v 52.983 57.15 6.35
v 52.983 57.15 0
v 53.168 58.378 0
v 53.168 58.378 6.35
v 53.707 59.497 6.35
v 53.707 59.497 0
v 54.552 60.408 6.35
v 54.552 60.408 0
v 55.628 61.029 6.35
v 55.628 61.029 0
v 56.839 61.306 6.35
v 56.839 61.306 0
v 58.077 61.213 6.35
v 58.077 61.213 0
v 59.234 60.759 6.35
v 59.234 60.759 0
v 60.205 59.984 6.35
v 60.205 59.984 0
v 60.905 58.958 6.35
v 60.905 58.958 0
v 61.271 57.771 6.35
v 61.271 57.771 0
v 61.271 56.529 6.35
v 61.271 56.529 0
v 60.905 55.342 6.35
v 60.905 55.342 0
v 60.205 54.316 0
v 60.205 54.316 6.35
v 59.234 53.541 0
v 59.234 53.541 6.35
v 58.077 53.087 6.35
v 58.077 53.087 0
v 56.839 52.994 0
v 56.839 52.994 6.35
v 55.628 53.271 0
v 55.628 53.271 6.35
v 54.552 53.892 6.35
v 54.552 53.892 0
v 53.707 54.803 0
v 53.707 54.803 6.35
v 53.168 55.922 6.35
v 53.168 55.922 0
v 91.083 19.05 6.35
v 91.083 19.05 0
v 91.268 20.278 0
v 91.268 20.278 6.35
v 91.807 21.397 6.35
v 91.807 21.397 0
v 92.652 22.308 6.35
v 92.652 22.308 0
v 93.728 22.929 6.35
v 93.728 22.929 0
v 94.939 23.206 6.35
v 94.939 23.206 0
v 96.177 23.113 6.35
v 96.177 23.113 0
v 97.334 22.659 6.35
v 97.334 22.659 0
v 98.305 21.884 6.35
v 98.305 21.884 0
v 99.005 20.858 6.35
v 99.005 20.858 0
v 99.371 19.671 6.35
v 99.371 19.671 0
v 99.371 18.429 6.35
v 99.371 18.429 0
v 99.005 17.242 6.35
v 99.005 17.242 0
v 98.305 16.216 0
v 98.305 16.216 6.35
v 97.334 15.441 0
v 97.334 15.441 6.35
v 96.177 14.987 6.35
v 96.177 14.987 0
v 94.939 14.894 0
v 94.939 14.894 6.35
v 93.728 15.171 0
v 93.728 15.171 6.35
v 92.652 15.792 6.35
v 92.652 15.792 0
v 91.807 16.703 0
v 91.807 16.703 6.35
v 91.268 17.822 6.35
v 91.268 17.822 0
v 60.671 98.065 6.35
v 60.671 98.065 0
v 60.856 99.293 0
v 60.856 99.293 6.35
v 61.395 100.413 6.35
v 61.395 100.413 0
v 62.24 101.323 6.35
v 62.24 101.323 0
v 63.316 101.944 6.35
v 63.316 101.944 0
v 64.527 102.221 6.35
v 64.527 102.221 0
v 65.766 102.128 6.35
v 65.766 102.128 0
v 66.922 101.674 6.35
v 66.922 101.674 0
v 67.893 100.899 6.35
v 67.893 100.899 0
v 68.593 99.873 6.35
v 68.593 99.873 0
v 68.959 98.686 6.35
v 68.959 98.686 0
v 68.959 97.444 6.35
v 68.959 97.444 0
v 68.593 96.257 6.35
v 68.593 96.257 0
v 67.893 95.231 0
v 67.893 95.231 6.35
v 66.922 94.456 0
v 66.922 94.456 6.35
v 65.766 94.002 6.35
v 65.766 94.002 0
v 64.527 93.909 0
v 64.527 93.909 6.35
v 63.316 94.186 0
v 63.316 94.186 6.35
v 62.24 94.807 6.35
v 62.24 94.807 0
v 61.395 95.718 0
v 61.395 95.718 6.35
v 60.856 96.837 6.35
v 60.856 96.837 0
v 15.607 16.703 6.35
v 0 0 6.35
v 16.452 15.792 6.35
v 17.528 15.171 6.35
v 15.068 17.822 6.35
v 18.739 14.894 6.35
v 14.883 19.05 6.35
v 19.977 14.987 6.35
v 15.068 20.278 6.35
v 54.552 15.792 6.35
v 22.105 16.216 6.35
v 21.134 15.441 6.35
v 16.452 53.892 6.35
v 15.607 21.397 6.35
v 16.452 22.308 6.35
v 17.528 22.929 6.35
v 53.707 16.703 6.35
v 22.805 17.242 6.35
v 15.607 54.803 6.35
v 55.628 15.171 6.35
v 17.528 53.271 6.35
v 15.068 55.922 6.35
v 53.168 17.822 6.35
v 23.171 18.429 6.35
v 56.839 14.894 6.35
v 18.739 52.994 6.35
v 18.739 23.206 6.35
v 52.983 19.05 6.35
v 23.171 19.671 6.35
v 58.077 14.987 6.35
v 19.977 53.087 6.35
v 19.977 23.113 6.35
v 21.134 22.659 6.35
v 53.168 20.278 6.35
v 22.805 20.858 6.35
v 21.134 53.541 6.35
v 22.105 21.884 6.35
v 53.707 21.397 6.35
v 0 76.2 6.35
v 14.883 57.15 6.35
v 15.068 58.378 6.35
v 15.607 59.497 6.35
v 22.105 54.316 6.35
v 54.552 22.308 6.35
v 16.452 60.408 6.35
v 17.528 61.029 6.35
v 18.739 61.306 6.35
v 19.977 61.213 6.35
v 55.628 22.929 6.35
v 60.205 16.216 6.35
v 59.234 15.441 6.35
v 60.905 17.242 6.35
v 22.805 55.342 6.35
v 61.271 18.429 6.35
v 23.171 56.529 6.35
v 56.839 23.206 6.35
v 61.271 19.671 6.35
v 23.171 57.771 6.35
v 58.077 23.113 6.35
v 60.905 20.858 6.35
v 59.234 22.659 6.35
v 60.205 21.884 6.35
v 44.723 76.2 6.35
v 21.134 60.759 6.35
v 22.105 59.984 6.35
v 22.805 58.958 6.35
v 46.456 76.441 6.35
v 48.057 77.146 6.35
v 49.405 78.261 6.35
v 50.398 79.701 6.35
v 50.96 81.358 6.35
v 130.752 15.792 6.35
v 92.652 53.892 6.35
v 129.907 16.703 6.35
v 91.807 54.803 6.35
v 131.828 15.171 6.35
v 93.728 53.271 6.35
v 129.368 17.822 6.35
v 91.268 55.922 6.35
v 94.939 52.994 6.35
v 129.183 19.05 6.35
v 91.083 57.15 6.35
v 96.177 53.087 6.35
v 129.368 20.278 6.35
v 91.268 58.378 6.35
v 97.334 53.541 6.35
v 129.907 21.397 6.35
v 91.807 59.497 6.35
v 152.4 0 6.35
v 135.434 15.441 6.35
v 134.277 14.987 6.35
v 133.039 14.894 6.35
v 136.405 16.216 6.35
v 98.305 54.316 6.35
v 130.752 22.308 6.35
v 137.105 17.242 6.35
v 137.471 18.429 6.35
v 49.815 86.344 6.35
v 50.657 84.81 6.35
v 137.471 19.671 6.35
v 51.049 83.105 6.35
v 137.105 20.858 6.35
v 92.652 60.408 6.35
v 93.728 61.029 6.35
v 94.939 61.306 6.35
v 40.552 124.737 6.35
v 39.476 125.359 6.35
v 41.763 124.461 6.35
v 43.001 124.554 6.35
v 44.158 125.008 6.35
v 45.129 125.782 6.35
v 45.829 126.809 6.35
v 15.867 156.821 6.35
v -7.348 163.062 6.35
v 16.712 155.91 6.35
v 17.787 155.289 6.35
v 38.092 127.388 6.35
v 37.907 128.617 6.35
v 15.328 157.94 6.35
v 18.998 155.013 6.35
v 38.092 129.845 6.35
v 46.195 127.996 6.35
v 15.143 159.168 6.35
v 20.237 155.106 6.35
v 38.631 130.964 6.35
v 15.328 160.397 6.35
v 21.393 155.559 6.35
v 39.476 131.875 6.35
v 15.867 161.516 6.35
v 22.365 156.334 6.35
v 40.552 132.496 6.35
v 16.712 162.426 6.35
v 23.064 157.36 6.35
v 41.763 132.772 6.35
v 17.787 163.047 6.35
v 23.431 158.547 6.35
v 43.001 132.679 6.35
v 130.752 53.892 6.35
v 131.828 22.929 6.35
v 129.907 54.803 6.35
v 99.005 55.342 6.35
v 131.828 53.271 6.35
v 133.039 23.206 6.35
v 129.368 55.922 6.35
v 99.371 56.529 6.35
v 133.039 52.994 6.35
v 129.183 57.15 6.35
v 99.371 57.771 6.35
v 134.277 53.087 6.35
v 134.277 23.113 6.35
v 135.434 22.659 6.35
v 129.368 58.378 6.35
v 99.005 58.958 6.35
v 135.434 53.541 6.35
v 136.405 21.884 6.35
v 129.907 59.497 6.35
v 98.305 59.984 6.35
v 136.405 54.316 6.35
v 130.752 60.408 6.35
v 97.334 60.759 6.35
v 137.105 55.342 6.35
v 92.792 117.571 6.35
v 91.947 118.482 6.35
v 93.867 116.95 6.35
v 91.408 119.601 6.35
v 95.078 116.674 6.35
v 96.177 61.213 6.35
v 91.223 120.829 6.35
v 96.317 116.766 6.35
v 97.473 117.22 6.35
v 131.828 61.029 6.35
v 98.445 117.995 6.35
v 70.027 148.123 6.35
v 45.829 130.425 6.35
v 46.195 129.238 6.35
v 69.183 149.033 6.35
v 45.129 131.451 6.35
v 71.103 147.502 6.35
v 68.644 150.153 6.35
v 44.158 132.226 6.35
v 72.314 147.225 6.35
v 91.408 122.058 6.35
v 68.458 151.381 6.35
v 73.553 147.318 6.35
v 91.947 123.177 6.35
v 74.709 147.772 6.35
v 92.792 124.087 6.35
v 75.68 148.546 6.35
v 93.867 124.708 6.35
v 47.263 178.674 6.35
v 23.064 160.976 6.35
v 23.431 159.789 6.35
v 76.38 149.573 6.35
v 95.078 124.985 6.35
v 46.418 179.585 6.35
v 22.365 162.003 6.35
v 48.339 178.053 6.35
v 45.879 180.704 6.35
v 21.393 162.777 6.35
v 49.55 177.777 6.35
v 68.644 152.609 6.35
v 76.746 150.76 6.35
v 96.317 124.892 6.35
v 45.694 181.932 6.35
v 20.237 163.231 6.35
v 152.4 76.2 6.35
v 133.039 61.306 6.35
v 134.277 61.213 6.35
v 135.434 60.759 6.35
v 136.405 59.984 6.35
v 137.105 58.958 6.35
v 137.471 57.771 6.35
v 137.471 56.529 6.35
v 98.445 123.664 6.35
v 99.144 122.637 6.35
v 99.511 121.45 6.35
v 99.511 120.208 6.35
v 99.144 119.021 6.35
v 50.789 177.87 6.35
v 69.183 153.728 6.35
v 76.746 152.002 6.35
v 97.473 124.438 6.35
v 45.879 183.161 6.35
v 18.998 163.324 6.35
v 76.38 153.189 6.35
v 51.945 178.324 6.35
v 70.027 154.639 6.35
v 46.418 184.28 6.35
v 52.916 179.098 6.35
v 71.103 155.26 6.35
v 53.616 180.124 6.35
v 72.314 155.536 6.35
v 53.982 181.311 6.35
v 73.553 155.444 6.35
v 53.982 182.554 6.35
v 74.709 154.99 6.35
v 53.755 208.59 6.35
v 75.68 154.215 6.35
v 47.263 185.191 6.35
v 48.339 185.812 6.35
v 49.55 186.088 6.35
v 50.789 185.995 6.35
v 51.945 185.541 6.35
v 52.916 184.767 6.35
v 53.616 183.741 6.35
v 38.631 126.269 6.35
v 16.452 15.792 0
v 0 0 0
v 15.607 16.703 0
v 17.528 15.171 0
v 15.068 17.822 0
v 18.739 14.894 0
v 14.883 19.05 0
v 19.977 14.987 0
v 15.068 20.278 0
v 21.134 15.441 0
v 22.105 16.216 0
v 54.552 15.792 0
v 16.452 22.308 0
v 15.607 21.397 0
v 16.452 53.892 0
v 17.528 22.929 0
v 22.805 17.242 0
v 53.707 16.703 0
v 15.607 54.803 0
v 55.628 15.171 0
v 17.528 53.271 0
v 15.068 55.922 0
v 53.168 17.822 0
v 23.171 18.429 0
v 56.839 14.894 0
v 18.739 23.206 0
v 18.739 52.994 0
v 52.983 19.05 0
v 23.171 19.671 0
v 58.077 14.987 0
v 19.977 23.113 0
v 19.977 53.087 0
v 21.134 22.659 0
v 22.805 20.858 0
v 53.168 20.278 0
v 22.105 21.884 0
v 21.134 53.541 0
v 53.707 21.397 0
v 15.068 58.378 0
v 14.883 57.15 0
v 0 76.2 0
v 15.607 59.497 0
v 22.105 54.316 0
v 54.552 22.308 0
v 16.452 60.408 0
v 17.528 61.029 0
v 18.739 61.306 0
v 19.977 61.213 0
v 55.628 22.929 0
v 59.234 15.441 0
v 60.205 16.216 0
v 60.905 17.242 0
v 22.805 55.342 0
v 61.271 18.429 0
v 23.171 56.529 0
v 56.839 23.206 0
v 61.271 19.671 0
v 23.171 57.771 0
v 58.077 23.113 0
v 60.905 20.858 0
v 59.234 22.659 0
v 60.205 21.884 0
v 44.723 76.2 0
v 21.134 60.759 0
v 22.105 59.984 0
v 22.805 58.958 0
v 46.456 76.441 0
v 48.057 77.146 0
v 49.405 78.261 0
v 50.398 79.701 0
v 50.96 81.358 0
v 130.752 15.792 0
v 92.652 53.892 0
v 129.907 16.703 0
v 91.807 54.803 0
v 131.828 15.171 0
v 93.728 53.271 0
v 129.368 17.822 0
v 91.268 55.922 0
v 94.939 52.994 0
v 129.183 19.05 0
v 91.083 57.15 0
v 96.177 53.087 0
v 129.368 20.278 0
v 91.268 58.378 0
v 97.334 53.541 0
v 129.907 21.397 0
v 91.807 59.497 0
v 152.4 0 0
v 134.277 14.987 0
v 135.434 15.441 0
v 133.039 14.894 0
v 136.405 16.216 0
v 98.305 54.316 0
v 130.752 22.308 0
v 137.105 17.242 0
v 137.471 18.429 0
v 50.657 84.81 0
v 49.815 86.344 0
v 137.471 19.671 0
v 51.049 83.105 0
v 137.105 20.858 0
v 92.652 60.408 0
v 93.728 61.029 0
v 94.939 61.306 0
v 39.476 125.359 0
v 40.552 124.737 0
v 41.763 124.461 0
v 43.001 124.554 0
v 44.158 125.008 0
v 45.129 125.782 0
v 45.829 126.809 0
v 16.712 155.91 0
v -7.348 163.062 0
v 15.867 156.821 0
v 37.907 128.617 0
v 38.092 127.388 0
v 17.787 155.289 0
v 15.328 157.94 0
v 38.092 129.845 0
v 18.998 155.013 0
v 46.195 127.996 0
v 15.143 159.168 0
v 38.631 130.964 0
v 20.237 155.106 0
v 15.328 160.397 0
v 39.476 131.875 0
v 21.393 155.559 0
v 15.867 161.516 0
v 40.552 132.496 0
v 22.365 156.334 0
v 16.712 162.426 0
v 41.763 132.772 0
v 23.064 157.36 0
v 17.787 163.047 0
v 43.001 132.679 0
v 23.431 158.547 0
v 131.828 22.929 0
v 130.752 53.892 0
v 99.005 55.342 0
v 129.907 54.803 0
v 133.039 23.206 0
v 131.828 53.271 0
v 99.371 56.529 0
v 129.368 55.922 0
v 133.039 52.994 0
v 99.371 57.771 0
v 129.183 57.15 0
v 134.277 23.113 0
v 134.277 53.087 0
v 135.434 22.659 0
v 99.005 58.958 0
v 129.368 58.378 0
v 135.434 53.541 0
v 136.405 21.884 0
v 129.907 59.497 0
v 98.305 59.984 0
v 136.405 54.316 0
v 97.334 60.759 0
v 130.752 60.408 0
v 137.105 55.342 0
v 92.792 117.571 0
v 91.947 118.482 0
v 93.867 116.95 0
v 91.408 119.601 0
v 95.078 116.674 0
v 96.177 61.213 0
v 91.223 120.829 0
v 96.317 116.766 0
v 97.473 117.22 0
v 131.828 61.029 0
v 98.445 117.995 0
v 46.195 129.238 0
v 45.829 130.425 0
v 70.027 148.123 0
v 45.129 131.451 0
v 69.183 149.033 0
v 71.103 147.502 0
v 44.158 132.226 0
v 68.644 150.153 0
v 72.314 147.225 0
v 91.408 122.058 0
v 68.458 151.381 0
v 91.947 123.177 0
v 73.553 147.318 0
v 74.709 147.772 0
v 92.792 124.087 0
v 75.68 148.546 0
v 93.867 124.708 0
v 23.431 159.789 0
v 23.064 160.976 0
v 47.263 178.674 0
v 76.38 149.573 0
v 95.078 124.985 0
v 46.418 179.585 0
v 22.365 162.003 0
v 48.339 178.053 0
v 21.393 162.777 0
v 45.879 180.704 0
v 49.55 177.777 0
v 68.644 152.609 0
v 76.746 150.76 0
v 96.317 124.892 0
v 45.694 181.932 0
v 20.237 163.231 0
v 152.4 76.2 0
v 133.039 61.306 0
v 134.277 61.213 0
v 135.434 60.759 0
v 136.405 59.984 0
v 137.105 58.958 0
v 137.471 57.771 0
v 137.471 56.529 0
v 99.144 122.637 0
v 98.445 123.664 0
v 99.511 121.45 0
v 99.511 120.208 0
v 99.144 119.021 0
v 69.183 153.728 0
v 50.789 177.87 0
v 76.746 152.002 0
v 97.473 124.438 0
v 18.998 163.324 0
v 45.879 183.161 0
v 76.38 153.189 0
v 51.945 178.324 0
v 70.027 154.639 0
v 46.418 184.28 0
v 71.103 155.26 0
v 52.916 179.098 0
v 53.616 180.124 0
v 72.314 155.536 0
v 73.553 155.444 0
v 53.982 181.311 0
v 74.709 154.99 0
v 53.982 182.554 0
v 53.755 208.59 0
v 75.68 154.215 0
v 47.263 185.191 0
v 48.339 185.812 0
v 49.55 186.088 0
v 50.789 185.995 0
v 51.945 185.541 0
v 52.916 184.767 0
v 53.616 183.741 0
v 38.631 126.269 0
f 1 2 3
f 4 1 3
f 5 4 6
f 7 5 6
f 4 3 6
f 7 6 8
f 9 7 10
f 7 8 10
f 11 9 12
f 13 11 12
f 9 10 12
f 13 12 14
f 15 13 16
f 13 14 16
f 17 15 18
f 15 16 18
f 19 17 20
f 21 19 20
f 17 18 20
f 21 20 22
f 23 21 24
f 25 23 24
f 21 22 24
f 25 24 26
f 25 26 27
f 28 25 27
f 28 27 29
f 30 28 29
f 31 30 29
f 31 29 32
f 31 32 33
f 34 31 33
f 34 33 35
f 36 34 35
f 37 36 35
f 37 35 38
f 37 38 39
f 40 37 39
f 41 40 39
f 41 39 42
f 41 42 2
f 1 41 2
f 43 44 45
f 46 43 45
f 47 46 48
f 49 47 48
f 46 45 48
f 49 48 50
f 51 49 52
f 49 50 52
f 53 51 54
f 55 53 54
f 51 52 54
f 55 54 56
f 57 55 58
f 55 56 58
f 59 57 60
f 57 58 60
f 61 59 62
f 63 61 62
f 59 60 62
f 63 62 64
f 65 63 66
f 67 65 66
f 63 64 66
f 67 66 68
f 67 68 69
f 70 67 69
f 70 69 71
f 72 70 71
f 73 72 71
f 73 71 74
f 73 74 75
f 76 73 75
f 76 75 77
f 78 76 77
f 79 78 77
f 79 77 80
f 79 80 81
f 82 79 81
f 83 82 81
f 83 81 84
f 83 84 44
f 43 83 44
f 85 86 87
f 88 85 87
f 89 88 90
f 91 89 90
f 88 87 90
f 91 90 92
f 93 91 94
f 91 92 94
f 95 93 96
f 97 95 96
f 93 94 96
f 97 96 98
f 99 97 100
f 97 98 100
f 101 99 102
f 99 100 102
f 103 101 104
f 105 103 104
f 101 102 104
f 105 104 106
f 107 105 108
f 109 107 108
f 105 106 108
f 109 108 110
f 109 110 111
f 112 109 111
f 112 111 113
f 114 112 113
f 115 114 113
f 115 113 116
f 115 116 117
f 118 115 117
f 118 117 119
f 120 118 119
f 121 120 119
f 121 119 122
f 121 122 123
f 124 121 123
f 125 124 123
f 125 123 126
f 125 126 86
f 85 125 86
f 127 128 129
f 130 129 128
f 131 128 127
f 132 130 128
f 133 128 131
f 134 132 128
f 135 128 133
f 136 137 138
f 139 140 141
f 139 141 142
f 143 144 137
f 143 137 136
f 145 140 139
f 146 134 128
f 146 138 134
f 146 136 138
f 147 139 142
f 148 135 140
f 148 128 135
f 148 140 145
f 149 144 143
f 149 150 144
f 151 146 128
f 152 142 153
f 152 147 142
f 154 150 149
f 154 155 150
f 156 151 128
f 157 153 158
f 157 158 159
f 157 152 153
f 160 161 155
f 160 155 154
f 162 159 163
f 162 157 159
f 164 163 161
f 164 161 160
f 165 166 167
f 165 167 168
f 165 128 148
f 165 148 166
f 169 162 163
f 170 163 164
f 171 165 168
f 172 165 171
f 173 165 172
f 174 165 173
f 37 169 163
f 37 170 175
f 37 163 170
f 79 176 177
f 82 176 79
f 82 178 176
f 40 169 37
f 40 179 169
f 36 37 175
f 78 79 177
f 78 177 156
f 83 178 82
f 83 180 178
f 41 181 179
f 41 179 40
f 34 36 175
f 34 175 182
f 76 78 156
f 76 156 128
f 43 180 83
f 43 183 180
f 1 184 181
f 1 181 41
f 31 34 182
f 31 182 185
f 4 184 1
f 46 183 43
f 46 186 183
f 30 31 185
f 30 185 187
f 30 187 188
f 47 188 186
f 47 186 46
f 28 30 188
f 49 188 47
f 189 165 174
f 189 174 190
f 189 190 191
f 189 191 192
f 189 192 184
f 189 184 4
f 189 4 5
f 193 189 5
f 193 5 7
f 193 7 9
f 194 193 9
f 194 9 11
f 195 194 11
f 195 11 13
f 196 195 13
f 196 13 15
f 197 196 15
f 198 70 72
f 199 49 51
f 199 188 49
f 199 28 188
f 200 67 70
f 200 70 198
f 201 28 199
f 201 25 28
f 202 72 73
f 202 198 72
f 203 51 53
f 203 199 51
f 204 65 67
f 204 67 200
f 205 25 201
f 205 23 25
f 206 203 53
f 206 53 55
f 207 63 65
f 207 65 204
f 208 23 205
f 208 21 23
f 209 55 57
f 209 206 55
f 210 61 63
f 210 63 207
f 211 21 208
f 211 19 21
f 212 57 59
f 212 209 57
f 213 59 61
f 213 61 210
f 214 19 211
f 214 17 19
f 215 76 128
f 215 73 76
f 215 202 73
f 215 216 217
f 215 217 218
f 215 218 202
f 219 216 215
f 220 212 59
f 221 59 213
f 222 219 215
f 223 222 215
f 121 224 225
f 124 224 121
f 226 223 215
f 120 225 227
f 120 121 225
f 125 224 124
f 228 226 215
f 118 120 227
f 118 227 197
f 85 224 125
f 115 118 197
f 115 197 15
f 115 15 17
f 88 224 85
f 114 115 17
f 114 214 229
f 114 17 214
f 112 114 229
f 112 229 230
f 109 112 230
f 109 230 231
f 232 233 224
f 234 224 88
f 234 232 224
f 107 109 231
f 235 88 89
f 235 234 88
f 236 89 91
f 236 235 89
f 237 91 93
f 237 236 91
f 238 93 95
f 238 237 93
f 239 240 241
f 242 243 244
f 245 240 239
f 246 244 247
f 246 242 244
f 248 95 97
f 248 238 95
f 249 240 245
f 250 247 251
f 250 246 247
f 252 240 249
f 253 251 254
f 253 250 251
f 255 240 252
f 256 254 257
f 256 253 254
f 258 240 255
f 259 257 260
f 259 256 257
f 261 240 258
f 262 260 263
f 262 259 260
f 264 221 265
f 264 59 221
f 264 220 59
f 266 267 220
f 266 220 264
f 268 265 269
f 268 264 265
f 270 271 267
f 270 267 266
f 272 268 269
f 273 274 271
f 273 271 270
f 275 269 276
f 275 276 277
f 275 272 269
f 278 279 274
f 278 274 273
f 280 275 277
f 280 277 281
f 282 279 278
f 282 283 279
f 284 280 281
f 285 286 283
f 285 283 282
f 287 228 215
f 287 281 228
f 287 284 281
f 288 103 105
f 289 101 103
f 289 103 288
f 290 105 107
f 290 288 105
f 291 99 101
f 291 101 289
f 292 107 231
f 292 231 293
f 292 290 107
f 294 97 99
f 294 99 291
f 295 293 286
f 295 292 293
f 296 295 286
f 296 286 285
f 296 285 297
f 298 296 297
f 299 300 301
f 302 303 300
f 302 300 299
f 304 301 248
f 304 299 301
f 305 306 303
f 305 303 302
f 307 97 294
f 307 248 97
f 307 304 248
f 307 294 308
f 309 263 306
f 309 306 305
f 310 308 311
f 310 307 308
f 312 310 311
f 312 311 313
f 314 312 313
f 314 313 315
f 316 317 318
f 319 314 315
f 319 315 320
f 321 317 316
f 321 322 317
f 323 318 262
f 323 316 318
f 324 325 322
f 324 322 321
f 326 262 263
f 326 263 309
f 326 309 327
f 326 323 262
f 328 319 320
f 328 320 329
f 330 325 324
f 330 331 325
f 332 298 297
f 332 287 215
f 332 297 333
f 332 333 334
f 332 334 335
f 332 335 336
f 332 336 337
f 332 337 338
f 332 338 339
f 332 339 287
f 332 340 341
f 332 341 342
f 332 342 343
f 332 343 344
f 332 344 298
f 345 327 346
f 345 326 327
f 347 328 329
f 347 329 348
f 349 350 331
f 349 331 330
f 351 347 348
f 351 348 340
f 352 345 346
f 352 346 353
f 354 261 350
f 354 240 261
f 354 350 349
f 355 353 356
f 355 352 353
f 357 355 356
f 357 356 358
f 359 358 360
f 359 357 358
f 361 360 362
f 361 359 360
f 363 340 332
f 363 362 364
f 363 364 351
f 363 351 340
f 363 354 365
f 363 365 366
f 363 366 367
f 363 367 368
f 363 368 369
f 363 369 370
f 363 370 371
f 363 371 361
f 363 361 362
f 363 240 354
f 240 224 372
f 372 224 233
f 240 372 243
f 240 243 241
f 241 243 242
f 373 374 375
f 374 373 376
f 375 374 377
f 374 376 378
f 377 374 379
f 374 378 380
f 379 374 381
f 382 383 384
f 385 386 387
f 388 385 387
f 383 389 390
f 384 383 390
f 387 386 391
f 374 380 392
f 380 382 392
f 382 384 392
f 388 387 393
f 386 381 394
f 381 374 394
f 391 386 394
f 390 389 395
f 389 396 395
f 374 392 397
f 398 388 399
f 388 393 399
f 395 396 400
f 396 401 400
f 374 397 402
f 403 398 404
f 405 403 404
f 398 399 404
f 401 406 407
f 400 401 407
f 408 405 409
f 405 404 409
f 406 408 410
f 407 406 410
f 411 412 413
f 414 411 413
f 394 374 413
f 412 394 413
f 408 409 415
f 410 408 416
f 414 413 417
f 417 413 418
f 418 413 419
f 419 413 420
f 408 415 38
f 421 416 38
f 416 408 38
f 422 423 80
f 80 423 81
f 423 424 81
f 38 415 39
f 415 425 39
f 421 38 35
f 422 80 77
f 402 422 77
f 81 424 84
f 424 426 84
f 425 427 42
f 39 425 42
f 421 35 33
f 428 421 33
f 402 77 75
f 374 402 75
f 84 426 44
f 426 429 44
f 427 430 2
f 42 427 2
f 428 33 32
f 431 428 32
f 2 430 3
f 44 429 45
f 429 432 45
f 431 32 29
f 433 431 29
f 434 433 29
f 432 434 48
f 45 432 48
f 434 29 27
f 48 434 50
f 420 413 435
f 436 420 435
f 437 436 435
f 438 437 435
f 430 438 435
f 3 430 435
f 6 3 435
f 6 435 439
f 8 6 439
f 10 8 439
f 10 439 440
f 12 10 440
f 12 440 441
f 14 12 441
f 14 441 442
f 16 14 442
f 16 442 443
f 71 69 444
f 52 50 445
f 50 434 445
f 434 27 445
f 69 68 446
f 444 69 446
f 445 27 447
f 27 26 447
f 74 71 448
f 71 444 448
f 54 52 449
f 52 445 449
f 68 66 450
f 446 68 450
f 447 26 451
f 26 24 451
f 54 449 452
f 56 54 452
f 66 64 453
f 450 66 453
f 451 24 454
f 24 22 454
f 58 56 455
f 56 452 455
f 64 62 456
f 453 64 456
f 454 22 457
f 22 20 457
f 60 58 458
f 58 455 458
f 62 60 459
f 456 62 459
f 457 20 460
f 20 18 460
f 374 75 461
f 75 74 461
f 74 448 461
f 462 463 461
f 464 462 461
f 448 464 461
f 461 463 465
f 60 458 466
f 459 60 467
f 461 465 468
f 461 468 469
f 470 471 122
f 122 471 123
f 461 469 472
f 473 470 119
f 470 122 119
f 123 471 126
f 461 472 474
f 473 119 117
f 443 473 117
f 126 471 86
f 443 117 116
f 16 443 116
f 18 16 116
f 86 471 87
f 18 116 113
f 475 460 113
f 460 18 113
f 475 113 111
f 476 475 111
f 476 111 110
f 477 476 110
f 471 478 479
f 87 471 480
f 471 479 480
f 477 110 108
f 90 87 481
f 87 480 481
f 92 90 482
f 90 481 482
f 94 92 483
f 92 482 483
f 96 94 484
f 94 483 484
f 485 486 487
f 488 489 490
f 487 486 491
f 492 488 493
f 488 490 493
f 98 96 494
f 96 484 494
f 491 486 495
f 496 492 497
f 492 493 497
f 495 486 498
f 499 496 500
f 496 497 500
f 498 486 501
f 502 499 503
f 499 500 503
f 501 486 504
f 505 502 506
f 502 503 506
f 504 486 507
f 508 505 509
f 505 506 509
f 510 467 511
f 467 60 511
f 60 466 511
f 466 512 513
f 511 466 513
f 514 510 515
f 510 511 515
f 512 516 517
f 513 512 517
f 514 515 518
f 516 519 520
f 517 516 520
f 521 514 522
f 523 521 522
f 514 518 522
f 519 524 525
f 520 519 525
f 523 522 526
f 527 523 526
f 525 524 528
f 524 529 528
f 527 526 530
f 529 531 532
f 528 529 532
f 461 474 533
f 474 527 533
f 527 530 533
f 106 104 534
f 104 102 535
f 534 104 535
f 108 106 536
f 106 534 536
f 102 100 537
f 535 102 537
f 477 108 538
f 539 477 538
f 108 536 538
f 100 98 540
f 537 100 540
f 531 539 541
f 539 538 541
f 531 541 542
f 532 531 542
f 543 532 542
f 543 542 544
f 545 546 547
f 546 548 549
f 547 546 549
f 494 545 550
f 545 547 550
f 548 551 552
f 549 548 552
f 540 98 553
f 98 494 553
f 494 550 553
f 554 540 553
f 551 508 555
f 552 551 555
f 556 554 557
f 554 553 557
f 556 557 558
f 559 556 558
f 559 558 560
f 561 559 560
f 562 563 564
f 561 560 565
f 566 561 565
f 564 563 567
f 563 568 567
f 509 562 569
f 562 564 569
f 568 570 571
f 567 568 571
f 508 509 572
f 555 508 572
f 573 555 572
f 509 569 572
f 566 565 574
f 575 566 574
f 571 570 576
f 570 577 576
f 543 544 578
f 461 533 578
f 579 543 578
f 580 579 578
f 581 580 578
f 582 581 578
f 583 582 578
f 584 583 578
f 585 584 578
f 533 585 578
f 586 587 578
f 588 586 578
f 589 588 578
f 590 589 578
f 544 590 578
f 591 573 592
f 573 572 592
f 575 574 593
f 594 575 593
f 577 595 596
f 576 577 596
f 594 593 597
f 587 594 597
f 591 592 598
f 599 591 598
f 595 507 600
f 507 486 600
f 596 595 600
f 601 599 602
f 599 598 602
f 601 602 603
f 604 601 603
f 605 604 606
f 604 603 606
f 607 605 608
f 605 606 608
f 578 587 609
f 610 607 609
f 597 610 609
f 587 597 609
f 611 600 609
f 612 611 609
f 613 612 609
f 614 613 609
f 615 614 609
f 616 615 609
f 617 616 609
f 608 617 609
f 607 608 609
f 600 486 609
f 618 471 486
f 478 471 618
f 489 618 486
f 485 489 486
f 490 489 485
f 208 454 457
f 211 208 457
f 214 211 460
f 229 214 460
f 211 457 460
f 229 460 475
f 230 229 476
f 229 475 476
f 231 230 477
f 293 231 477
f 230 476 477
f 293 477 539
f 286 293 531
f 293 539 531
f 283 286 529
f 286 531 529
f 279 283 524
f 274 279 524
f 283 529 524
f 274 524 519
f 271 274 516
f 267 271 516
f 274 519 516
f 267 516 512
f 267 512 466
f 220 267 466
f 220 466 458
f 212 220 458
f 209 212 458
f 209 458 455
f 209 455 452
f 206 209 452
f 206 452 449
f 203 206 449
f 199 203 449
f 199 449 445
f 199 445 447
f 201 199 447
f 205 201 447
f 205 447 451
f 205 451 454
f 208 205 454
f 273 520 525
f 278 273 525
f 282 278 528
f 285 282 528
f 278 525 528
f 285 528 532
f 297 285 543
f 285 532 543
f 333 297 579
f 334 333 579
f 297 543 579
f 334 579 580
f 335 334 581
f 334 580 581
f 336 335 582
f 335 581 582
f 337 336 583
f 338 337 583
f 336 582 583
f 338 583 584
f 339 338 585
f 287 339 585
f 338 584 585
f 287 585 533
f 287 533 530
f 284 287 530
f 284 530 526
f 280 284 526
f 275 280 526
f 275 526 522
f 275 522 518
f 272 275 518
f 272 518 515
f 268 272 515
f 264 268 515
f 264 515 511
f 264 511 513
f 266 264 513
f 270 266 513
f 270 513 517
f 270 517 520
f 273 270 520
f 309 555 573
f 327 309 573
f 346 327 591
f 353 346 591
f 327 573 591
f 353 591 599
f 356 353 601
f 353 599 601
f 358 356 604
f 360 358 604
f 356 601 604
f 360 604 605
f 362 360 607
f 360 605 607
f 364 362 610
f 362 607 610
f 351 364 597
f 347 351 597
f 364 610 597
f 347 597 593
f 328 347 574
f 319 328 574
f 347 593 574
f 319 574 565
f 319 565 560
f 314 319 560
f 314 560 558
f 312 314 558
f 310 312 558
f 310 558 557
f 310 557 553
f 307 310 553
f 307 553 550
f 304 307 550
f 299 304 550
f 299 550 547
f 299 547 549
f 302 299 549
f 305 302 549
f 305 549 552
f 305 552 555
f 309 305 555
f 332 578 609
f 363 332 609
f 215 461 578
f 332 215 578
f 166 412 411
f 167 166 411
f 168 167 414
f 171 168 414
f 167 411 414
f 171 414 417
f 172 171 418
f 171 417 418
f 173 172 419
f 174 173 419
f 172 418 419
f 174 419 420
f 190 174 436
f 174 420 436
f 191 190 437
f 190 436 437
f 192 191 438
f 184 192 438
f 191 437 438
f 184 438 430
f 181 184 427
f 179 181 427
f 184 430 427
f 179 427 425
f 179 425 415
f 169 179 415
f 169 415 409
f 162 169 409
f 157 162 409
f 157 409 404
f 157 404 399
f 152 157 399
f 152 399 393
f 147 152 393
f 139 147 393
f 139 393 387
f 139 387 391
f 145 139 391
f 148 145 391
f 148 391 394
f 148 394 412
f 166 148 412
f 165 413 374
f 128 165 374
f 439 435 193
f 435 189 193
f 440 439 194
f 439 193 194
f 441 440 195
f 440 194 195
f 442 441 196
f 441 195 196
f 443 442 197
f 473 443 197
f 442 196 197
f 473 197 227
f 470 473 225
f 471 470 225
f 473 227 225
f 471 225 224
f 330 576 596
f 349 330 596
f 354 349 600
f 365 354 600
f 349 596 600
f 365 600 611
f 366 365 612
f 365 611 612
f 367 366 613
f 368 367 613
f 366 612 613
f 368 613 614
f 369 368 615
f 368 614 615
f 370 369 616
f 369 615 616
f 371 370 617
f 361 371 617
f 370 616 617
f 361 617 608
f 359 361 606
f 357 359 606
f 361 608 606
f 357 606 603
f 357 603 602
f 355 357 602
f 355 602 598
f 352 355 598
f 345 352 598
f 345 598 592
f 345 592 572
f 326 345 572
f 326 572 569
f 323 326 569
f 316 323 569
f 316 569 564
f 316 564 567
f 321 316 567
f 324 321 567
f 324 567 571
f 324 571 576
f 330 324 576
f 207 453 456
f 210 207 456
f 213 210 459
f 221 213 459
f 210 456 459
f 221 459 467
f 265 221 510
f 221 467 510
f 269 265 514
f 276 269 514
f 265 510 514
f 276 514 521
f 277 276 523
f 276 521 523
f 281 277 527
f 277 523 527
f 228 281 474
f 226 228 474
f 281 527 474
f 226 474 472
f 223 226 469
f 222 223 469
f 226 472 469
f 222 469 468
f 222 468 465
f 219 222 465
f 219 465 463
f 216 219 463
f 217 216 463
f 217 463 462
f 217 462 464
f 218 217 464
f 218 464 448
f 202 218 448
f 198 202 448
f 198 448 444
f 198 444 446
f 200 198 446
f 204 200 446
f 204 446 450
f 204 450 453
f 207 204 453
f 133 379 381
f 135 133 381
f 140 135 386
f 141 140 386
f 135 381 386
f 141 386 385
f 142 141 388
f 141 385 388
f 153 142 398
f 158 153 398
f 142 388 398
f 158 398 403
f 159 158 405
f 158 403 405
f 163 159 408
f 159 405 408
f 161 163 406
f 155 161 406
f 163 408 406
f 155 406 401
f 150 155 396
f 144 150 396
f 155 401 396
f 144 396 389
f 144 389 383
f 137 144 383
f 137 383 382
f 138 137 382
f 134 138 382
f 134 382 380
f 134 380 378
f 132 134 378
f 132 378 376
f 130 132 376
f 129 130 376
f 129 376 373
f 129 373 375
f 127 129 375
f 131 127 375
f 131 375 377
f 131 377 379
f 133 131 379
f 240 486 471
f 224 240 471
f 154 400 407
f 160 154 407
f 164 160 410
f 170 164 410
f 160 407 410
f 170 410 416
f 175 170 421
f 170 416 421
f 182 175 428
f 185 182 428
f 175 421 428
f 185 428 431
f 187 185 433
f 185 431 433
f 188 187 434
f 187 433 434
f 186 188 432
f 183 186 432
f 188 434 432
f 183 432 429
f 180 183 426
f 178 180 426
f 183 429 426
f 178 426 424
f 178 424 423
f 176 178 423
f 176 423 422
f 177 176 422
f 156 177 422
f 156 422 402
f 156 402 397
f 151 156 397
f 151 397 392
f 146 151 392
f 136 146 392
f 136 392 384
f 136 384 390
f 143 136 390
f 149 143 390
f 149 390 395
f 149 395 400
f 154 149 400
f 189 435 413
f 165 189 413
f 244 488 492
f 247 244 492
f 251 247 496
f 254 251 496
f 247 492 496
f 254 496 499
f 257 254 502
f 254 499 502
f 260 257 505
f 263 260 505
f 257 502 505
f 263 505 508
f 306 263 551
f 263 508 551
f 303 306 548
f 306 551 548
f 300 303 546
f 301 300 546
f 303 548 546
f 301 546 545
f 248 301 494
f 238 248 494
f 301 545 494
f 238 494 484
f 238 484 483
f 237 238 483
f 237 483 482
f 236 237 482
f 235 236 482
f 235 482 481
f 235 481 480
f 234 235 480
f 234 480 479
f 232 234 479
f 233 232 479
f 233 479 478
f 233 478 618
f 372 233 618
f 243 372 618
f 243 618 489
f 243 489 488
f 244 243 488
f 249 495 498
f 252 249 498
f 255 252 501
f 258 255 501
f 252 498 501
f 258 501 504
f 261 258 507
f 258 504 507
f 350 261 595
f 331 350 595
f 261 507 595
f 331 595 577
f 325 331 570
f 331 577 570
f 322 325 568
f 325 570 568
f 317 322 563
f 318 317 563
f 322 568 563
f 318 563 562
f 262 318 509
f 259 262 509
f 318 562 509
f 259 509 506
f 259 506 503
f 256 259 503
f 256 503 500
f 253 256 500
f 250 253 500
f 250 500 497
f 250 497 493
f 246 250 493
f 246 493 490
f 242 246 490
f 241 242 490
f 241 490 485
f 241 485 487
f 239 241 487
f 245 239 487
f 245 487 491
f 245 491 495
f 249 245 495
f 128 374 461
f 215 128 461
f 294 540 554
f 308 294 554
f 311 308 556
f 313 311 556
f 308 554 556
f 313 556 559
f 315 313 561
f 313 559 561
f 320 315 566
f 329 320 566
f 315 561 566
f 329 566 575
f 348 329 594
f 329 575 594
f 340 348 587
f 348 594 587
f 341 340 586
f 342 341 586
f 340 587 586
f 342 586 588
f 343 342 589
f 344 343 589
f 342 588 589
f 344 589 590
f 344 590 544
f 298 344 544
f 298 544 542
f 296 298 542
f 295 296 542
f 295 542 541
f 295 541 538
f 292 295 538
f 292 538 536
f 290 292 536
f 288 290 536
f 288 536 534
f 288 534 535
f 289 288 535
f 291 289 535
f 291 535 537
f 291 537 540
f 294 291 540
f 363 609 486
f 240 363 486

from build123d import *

# Parameters (mm, degrees)
BOSS_EXTRUDE1_DEPTH              = 6.35
F_21_64_0_32813_DIAMETER_HOLE1_D = 8.334502
LPATTERN1_COUNT                  = 4
LPATTERN1_PITCH                  = 38.1
LPATTERN1_COUNT_DIR2             = 2
LPATTERN1_PITCH_DIR2             = 38.1
F_21_64_0_32813_DIAMETER_HOLE2_D = 8.334502
LPATTERN2_COUNT                  = 3
LPATTERN2_PITCH                  = 38.1
LPATTERN2_COUNT_DIR2             = 2
LPATTERN2_PITCH_DIR2             = 38.1
FILLET1_R                        = 6.35


with BuildPart() as part:
    # Sketch2 → Boss-Extrude1 (new body)
    with BuildSketch(Plane.XY):
        Polygon((0, 0), (152.4, 0), (152.4, 76.2), (53.755193212, 208.590377648), (-7.34805801, 163.062005284), (57.373305284, 76.2), (0, 76.2), align=None)
    extrude(amount=BOSS_EXTRUDE1_DEPTH)

    # 21/64 (0.32813) Diameter Hole1 (through all)
    with Locations(Plane.XY.offset(6.35)):
        with Locations((133.35, 19.05)):
            f_21_64_0_32813_diameter_hole1 = Hole(F_21_64_0_32813_DIAMETER_HOLE1_D / 2)

    # LPattern1: 21_64 _0.32813_ Diameter Hole1 4 × 2
    with Locations(*[(-i * LPATTERN1_PITCH, j * LPATTERN1_PITCH_DIR2, 0) for i in range(LPATTERN1_COUNT) for j in range(LPATTERN1_COUNT_DIR2) if (i, j) != (0, 0)]):
        add(f_21_64_0_32813_diameter_hole1, mode=Mode.SUBTRACT)

    # 21/64 (0.32813) Diameter Hole2 (through all)
    with Locations(Plane.XY.offset(6.35)):
        with Locations((49.861473497, 181.932471751)):
            f_21_64_0_32813_diameter_hole2 = Hole(F_21_64_0_32813_DIAMETER_HOLE2_D / 2)

    # LPattern2: 21_64 _0.32813_ Diameter Hole2 3 × 2
    with Locations(*[Vector(0.5974852016253348, -0.8018799372965589, 0) * (i * LPATTERN2_PITCH) + Vector(-0.8018799372965586, -0.5974852016253351, 0) * (j * LPATTERN2_PITCH_DIR2) for i in range(LPATTERN2_COUNT) for j in range(LPATTERN2_COUNT_DIR2) if (i, j) != (0, 0)]):
        add(f_21_64_0_32813_diameter_hole2, mode=Mode.SUBTRACT)

    # Fillet1
    fillet1_edges = [part.edges().sort_by_distance(p)[0] for p in [
        (57.373305284, 76.2, 3.175),
    ]]
    fillet(fillet1_edges, radius=FILLET1_R)


solid = part.part
